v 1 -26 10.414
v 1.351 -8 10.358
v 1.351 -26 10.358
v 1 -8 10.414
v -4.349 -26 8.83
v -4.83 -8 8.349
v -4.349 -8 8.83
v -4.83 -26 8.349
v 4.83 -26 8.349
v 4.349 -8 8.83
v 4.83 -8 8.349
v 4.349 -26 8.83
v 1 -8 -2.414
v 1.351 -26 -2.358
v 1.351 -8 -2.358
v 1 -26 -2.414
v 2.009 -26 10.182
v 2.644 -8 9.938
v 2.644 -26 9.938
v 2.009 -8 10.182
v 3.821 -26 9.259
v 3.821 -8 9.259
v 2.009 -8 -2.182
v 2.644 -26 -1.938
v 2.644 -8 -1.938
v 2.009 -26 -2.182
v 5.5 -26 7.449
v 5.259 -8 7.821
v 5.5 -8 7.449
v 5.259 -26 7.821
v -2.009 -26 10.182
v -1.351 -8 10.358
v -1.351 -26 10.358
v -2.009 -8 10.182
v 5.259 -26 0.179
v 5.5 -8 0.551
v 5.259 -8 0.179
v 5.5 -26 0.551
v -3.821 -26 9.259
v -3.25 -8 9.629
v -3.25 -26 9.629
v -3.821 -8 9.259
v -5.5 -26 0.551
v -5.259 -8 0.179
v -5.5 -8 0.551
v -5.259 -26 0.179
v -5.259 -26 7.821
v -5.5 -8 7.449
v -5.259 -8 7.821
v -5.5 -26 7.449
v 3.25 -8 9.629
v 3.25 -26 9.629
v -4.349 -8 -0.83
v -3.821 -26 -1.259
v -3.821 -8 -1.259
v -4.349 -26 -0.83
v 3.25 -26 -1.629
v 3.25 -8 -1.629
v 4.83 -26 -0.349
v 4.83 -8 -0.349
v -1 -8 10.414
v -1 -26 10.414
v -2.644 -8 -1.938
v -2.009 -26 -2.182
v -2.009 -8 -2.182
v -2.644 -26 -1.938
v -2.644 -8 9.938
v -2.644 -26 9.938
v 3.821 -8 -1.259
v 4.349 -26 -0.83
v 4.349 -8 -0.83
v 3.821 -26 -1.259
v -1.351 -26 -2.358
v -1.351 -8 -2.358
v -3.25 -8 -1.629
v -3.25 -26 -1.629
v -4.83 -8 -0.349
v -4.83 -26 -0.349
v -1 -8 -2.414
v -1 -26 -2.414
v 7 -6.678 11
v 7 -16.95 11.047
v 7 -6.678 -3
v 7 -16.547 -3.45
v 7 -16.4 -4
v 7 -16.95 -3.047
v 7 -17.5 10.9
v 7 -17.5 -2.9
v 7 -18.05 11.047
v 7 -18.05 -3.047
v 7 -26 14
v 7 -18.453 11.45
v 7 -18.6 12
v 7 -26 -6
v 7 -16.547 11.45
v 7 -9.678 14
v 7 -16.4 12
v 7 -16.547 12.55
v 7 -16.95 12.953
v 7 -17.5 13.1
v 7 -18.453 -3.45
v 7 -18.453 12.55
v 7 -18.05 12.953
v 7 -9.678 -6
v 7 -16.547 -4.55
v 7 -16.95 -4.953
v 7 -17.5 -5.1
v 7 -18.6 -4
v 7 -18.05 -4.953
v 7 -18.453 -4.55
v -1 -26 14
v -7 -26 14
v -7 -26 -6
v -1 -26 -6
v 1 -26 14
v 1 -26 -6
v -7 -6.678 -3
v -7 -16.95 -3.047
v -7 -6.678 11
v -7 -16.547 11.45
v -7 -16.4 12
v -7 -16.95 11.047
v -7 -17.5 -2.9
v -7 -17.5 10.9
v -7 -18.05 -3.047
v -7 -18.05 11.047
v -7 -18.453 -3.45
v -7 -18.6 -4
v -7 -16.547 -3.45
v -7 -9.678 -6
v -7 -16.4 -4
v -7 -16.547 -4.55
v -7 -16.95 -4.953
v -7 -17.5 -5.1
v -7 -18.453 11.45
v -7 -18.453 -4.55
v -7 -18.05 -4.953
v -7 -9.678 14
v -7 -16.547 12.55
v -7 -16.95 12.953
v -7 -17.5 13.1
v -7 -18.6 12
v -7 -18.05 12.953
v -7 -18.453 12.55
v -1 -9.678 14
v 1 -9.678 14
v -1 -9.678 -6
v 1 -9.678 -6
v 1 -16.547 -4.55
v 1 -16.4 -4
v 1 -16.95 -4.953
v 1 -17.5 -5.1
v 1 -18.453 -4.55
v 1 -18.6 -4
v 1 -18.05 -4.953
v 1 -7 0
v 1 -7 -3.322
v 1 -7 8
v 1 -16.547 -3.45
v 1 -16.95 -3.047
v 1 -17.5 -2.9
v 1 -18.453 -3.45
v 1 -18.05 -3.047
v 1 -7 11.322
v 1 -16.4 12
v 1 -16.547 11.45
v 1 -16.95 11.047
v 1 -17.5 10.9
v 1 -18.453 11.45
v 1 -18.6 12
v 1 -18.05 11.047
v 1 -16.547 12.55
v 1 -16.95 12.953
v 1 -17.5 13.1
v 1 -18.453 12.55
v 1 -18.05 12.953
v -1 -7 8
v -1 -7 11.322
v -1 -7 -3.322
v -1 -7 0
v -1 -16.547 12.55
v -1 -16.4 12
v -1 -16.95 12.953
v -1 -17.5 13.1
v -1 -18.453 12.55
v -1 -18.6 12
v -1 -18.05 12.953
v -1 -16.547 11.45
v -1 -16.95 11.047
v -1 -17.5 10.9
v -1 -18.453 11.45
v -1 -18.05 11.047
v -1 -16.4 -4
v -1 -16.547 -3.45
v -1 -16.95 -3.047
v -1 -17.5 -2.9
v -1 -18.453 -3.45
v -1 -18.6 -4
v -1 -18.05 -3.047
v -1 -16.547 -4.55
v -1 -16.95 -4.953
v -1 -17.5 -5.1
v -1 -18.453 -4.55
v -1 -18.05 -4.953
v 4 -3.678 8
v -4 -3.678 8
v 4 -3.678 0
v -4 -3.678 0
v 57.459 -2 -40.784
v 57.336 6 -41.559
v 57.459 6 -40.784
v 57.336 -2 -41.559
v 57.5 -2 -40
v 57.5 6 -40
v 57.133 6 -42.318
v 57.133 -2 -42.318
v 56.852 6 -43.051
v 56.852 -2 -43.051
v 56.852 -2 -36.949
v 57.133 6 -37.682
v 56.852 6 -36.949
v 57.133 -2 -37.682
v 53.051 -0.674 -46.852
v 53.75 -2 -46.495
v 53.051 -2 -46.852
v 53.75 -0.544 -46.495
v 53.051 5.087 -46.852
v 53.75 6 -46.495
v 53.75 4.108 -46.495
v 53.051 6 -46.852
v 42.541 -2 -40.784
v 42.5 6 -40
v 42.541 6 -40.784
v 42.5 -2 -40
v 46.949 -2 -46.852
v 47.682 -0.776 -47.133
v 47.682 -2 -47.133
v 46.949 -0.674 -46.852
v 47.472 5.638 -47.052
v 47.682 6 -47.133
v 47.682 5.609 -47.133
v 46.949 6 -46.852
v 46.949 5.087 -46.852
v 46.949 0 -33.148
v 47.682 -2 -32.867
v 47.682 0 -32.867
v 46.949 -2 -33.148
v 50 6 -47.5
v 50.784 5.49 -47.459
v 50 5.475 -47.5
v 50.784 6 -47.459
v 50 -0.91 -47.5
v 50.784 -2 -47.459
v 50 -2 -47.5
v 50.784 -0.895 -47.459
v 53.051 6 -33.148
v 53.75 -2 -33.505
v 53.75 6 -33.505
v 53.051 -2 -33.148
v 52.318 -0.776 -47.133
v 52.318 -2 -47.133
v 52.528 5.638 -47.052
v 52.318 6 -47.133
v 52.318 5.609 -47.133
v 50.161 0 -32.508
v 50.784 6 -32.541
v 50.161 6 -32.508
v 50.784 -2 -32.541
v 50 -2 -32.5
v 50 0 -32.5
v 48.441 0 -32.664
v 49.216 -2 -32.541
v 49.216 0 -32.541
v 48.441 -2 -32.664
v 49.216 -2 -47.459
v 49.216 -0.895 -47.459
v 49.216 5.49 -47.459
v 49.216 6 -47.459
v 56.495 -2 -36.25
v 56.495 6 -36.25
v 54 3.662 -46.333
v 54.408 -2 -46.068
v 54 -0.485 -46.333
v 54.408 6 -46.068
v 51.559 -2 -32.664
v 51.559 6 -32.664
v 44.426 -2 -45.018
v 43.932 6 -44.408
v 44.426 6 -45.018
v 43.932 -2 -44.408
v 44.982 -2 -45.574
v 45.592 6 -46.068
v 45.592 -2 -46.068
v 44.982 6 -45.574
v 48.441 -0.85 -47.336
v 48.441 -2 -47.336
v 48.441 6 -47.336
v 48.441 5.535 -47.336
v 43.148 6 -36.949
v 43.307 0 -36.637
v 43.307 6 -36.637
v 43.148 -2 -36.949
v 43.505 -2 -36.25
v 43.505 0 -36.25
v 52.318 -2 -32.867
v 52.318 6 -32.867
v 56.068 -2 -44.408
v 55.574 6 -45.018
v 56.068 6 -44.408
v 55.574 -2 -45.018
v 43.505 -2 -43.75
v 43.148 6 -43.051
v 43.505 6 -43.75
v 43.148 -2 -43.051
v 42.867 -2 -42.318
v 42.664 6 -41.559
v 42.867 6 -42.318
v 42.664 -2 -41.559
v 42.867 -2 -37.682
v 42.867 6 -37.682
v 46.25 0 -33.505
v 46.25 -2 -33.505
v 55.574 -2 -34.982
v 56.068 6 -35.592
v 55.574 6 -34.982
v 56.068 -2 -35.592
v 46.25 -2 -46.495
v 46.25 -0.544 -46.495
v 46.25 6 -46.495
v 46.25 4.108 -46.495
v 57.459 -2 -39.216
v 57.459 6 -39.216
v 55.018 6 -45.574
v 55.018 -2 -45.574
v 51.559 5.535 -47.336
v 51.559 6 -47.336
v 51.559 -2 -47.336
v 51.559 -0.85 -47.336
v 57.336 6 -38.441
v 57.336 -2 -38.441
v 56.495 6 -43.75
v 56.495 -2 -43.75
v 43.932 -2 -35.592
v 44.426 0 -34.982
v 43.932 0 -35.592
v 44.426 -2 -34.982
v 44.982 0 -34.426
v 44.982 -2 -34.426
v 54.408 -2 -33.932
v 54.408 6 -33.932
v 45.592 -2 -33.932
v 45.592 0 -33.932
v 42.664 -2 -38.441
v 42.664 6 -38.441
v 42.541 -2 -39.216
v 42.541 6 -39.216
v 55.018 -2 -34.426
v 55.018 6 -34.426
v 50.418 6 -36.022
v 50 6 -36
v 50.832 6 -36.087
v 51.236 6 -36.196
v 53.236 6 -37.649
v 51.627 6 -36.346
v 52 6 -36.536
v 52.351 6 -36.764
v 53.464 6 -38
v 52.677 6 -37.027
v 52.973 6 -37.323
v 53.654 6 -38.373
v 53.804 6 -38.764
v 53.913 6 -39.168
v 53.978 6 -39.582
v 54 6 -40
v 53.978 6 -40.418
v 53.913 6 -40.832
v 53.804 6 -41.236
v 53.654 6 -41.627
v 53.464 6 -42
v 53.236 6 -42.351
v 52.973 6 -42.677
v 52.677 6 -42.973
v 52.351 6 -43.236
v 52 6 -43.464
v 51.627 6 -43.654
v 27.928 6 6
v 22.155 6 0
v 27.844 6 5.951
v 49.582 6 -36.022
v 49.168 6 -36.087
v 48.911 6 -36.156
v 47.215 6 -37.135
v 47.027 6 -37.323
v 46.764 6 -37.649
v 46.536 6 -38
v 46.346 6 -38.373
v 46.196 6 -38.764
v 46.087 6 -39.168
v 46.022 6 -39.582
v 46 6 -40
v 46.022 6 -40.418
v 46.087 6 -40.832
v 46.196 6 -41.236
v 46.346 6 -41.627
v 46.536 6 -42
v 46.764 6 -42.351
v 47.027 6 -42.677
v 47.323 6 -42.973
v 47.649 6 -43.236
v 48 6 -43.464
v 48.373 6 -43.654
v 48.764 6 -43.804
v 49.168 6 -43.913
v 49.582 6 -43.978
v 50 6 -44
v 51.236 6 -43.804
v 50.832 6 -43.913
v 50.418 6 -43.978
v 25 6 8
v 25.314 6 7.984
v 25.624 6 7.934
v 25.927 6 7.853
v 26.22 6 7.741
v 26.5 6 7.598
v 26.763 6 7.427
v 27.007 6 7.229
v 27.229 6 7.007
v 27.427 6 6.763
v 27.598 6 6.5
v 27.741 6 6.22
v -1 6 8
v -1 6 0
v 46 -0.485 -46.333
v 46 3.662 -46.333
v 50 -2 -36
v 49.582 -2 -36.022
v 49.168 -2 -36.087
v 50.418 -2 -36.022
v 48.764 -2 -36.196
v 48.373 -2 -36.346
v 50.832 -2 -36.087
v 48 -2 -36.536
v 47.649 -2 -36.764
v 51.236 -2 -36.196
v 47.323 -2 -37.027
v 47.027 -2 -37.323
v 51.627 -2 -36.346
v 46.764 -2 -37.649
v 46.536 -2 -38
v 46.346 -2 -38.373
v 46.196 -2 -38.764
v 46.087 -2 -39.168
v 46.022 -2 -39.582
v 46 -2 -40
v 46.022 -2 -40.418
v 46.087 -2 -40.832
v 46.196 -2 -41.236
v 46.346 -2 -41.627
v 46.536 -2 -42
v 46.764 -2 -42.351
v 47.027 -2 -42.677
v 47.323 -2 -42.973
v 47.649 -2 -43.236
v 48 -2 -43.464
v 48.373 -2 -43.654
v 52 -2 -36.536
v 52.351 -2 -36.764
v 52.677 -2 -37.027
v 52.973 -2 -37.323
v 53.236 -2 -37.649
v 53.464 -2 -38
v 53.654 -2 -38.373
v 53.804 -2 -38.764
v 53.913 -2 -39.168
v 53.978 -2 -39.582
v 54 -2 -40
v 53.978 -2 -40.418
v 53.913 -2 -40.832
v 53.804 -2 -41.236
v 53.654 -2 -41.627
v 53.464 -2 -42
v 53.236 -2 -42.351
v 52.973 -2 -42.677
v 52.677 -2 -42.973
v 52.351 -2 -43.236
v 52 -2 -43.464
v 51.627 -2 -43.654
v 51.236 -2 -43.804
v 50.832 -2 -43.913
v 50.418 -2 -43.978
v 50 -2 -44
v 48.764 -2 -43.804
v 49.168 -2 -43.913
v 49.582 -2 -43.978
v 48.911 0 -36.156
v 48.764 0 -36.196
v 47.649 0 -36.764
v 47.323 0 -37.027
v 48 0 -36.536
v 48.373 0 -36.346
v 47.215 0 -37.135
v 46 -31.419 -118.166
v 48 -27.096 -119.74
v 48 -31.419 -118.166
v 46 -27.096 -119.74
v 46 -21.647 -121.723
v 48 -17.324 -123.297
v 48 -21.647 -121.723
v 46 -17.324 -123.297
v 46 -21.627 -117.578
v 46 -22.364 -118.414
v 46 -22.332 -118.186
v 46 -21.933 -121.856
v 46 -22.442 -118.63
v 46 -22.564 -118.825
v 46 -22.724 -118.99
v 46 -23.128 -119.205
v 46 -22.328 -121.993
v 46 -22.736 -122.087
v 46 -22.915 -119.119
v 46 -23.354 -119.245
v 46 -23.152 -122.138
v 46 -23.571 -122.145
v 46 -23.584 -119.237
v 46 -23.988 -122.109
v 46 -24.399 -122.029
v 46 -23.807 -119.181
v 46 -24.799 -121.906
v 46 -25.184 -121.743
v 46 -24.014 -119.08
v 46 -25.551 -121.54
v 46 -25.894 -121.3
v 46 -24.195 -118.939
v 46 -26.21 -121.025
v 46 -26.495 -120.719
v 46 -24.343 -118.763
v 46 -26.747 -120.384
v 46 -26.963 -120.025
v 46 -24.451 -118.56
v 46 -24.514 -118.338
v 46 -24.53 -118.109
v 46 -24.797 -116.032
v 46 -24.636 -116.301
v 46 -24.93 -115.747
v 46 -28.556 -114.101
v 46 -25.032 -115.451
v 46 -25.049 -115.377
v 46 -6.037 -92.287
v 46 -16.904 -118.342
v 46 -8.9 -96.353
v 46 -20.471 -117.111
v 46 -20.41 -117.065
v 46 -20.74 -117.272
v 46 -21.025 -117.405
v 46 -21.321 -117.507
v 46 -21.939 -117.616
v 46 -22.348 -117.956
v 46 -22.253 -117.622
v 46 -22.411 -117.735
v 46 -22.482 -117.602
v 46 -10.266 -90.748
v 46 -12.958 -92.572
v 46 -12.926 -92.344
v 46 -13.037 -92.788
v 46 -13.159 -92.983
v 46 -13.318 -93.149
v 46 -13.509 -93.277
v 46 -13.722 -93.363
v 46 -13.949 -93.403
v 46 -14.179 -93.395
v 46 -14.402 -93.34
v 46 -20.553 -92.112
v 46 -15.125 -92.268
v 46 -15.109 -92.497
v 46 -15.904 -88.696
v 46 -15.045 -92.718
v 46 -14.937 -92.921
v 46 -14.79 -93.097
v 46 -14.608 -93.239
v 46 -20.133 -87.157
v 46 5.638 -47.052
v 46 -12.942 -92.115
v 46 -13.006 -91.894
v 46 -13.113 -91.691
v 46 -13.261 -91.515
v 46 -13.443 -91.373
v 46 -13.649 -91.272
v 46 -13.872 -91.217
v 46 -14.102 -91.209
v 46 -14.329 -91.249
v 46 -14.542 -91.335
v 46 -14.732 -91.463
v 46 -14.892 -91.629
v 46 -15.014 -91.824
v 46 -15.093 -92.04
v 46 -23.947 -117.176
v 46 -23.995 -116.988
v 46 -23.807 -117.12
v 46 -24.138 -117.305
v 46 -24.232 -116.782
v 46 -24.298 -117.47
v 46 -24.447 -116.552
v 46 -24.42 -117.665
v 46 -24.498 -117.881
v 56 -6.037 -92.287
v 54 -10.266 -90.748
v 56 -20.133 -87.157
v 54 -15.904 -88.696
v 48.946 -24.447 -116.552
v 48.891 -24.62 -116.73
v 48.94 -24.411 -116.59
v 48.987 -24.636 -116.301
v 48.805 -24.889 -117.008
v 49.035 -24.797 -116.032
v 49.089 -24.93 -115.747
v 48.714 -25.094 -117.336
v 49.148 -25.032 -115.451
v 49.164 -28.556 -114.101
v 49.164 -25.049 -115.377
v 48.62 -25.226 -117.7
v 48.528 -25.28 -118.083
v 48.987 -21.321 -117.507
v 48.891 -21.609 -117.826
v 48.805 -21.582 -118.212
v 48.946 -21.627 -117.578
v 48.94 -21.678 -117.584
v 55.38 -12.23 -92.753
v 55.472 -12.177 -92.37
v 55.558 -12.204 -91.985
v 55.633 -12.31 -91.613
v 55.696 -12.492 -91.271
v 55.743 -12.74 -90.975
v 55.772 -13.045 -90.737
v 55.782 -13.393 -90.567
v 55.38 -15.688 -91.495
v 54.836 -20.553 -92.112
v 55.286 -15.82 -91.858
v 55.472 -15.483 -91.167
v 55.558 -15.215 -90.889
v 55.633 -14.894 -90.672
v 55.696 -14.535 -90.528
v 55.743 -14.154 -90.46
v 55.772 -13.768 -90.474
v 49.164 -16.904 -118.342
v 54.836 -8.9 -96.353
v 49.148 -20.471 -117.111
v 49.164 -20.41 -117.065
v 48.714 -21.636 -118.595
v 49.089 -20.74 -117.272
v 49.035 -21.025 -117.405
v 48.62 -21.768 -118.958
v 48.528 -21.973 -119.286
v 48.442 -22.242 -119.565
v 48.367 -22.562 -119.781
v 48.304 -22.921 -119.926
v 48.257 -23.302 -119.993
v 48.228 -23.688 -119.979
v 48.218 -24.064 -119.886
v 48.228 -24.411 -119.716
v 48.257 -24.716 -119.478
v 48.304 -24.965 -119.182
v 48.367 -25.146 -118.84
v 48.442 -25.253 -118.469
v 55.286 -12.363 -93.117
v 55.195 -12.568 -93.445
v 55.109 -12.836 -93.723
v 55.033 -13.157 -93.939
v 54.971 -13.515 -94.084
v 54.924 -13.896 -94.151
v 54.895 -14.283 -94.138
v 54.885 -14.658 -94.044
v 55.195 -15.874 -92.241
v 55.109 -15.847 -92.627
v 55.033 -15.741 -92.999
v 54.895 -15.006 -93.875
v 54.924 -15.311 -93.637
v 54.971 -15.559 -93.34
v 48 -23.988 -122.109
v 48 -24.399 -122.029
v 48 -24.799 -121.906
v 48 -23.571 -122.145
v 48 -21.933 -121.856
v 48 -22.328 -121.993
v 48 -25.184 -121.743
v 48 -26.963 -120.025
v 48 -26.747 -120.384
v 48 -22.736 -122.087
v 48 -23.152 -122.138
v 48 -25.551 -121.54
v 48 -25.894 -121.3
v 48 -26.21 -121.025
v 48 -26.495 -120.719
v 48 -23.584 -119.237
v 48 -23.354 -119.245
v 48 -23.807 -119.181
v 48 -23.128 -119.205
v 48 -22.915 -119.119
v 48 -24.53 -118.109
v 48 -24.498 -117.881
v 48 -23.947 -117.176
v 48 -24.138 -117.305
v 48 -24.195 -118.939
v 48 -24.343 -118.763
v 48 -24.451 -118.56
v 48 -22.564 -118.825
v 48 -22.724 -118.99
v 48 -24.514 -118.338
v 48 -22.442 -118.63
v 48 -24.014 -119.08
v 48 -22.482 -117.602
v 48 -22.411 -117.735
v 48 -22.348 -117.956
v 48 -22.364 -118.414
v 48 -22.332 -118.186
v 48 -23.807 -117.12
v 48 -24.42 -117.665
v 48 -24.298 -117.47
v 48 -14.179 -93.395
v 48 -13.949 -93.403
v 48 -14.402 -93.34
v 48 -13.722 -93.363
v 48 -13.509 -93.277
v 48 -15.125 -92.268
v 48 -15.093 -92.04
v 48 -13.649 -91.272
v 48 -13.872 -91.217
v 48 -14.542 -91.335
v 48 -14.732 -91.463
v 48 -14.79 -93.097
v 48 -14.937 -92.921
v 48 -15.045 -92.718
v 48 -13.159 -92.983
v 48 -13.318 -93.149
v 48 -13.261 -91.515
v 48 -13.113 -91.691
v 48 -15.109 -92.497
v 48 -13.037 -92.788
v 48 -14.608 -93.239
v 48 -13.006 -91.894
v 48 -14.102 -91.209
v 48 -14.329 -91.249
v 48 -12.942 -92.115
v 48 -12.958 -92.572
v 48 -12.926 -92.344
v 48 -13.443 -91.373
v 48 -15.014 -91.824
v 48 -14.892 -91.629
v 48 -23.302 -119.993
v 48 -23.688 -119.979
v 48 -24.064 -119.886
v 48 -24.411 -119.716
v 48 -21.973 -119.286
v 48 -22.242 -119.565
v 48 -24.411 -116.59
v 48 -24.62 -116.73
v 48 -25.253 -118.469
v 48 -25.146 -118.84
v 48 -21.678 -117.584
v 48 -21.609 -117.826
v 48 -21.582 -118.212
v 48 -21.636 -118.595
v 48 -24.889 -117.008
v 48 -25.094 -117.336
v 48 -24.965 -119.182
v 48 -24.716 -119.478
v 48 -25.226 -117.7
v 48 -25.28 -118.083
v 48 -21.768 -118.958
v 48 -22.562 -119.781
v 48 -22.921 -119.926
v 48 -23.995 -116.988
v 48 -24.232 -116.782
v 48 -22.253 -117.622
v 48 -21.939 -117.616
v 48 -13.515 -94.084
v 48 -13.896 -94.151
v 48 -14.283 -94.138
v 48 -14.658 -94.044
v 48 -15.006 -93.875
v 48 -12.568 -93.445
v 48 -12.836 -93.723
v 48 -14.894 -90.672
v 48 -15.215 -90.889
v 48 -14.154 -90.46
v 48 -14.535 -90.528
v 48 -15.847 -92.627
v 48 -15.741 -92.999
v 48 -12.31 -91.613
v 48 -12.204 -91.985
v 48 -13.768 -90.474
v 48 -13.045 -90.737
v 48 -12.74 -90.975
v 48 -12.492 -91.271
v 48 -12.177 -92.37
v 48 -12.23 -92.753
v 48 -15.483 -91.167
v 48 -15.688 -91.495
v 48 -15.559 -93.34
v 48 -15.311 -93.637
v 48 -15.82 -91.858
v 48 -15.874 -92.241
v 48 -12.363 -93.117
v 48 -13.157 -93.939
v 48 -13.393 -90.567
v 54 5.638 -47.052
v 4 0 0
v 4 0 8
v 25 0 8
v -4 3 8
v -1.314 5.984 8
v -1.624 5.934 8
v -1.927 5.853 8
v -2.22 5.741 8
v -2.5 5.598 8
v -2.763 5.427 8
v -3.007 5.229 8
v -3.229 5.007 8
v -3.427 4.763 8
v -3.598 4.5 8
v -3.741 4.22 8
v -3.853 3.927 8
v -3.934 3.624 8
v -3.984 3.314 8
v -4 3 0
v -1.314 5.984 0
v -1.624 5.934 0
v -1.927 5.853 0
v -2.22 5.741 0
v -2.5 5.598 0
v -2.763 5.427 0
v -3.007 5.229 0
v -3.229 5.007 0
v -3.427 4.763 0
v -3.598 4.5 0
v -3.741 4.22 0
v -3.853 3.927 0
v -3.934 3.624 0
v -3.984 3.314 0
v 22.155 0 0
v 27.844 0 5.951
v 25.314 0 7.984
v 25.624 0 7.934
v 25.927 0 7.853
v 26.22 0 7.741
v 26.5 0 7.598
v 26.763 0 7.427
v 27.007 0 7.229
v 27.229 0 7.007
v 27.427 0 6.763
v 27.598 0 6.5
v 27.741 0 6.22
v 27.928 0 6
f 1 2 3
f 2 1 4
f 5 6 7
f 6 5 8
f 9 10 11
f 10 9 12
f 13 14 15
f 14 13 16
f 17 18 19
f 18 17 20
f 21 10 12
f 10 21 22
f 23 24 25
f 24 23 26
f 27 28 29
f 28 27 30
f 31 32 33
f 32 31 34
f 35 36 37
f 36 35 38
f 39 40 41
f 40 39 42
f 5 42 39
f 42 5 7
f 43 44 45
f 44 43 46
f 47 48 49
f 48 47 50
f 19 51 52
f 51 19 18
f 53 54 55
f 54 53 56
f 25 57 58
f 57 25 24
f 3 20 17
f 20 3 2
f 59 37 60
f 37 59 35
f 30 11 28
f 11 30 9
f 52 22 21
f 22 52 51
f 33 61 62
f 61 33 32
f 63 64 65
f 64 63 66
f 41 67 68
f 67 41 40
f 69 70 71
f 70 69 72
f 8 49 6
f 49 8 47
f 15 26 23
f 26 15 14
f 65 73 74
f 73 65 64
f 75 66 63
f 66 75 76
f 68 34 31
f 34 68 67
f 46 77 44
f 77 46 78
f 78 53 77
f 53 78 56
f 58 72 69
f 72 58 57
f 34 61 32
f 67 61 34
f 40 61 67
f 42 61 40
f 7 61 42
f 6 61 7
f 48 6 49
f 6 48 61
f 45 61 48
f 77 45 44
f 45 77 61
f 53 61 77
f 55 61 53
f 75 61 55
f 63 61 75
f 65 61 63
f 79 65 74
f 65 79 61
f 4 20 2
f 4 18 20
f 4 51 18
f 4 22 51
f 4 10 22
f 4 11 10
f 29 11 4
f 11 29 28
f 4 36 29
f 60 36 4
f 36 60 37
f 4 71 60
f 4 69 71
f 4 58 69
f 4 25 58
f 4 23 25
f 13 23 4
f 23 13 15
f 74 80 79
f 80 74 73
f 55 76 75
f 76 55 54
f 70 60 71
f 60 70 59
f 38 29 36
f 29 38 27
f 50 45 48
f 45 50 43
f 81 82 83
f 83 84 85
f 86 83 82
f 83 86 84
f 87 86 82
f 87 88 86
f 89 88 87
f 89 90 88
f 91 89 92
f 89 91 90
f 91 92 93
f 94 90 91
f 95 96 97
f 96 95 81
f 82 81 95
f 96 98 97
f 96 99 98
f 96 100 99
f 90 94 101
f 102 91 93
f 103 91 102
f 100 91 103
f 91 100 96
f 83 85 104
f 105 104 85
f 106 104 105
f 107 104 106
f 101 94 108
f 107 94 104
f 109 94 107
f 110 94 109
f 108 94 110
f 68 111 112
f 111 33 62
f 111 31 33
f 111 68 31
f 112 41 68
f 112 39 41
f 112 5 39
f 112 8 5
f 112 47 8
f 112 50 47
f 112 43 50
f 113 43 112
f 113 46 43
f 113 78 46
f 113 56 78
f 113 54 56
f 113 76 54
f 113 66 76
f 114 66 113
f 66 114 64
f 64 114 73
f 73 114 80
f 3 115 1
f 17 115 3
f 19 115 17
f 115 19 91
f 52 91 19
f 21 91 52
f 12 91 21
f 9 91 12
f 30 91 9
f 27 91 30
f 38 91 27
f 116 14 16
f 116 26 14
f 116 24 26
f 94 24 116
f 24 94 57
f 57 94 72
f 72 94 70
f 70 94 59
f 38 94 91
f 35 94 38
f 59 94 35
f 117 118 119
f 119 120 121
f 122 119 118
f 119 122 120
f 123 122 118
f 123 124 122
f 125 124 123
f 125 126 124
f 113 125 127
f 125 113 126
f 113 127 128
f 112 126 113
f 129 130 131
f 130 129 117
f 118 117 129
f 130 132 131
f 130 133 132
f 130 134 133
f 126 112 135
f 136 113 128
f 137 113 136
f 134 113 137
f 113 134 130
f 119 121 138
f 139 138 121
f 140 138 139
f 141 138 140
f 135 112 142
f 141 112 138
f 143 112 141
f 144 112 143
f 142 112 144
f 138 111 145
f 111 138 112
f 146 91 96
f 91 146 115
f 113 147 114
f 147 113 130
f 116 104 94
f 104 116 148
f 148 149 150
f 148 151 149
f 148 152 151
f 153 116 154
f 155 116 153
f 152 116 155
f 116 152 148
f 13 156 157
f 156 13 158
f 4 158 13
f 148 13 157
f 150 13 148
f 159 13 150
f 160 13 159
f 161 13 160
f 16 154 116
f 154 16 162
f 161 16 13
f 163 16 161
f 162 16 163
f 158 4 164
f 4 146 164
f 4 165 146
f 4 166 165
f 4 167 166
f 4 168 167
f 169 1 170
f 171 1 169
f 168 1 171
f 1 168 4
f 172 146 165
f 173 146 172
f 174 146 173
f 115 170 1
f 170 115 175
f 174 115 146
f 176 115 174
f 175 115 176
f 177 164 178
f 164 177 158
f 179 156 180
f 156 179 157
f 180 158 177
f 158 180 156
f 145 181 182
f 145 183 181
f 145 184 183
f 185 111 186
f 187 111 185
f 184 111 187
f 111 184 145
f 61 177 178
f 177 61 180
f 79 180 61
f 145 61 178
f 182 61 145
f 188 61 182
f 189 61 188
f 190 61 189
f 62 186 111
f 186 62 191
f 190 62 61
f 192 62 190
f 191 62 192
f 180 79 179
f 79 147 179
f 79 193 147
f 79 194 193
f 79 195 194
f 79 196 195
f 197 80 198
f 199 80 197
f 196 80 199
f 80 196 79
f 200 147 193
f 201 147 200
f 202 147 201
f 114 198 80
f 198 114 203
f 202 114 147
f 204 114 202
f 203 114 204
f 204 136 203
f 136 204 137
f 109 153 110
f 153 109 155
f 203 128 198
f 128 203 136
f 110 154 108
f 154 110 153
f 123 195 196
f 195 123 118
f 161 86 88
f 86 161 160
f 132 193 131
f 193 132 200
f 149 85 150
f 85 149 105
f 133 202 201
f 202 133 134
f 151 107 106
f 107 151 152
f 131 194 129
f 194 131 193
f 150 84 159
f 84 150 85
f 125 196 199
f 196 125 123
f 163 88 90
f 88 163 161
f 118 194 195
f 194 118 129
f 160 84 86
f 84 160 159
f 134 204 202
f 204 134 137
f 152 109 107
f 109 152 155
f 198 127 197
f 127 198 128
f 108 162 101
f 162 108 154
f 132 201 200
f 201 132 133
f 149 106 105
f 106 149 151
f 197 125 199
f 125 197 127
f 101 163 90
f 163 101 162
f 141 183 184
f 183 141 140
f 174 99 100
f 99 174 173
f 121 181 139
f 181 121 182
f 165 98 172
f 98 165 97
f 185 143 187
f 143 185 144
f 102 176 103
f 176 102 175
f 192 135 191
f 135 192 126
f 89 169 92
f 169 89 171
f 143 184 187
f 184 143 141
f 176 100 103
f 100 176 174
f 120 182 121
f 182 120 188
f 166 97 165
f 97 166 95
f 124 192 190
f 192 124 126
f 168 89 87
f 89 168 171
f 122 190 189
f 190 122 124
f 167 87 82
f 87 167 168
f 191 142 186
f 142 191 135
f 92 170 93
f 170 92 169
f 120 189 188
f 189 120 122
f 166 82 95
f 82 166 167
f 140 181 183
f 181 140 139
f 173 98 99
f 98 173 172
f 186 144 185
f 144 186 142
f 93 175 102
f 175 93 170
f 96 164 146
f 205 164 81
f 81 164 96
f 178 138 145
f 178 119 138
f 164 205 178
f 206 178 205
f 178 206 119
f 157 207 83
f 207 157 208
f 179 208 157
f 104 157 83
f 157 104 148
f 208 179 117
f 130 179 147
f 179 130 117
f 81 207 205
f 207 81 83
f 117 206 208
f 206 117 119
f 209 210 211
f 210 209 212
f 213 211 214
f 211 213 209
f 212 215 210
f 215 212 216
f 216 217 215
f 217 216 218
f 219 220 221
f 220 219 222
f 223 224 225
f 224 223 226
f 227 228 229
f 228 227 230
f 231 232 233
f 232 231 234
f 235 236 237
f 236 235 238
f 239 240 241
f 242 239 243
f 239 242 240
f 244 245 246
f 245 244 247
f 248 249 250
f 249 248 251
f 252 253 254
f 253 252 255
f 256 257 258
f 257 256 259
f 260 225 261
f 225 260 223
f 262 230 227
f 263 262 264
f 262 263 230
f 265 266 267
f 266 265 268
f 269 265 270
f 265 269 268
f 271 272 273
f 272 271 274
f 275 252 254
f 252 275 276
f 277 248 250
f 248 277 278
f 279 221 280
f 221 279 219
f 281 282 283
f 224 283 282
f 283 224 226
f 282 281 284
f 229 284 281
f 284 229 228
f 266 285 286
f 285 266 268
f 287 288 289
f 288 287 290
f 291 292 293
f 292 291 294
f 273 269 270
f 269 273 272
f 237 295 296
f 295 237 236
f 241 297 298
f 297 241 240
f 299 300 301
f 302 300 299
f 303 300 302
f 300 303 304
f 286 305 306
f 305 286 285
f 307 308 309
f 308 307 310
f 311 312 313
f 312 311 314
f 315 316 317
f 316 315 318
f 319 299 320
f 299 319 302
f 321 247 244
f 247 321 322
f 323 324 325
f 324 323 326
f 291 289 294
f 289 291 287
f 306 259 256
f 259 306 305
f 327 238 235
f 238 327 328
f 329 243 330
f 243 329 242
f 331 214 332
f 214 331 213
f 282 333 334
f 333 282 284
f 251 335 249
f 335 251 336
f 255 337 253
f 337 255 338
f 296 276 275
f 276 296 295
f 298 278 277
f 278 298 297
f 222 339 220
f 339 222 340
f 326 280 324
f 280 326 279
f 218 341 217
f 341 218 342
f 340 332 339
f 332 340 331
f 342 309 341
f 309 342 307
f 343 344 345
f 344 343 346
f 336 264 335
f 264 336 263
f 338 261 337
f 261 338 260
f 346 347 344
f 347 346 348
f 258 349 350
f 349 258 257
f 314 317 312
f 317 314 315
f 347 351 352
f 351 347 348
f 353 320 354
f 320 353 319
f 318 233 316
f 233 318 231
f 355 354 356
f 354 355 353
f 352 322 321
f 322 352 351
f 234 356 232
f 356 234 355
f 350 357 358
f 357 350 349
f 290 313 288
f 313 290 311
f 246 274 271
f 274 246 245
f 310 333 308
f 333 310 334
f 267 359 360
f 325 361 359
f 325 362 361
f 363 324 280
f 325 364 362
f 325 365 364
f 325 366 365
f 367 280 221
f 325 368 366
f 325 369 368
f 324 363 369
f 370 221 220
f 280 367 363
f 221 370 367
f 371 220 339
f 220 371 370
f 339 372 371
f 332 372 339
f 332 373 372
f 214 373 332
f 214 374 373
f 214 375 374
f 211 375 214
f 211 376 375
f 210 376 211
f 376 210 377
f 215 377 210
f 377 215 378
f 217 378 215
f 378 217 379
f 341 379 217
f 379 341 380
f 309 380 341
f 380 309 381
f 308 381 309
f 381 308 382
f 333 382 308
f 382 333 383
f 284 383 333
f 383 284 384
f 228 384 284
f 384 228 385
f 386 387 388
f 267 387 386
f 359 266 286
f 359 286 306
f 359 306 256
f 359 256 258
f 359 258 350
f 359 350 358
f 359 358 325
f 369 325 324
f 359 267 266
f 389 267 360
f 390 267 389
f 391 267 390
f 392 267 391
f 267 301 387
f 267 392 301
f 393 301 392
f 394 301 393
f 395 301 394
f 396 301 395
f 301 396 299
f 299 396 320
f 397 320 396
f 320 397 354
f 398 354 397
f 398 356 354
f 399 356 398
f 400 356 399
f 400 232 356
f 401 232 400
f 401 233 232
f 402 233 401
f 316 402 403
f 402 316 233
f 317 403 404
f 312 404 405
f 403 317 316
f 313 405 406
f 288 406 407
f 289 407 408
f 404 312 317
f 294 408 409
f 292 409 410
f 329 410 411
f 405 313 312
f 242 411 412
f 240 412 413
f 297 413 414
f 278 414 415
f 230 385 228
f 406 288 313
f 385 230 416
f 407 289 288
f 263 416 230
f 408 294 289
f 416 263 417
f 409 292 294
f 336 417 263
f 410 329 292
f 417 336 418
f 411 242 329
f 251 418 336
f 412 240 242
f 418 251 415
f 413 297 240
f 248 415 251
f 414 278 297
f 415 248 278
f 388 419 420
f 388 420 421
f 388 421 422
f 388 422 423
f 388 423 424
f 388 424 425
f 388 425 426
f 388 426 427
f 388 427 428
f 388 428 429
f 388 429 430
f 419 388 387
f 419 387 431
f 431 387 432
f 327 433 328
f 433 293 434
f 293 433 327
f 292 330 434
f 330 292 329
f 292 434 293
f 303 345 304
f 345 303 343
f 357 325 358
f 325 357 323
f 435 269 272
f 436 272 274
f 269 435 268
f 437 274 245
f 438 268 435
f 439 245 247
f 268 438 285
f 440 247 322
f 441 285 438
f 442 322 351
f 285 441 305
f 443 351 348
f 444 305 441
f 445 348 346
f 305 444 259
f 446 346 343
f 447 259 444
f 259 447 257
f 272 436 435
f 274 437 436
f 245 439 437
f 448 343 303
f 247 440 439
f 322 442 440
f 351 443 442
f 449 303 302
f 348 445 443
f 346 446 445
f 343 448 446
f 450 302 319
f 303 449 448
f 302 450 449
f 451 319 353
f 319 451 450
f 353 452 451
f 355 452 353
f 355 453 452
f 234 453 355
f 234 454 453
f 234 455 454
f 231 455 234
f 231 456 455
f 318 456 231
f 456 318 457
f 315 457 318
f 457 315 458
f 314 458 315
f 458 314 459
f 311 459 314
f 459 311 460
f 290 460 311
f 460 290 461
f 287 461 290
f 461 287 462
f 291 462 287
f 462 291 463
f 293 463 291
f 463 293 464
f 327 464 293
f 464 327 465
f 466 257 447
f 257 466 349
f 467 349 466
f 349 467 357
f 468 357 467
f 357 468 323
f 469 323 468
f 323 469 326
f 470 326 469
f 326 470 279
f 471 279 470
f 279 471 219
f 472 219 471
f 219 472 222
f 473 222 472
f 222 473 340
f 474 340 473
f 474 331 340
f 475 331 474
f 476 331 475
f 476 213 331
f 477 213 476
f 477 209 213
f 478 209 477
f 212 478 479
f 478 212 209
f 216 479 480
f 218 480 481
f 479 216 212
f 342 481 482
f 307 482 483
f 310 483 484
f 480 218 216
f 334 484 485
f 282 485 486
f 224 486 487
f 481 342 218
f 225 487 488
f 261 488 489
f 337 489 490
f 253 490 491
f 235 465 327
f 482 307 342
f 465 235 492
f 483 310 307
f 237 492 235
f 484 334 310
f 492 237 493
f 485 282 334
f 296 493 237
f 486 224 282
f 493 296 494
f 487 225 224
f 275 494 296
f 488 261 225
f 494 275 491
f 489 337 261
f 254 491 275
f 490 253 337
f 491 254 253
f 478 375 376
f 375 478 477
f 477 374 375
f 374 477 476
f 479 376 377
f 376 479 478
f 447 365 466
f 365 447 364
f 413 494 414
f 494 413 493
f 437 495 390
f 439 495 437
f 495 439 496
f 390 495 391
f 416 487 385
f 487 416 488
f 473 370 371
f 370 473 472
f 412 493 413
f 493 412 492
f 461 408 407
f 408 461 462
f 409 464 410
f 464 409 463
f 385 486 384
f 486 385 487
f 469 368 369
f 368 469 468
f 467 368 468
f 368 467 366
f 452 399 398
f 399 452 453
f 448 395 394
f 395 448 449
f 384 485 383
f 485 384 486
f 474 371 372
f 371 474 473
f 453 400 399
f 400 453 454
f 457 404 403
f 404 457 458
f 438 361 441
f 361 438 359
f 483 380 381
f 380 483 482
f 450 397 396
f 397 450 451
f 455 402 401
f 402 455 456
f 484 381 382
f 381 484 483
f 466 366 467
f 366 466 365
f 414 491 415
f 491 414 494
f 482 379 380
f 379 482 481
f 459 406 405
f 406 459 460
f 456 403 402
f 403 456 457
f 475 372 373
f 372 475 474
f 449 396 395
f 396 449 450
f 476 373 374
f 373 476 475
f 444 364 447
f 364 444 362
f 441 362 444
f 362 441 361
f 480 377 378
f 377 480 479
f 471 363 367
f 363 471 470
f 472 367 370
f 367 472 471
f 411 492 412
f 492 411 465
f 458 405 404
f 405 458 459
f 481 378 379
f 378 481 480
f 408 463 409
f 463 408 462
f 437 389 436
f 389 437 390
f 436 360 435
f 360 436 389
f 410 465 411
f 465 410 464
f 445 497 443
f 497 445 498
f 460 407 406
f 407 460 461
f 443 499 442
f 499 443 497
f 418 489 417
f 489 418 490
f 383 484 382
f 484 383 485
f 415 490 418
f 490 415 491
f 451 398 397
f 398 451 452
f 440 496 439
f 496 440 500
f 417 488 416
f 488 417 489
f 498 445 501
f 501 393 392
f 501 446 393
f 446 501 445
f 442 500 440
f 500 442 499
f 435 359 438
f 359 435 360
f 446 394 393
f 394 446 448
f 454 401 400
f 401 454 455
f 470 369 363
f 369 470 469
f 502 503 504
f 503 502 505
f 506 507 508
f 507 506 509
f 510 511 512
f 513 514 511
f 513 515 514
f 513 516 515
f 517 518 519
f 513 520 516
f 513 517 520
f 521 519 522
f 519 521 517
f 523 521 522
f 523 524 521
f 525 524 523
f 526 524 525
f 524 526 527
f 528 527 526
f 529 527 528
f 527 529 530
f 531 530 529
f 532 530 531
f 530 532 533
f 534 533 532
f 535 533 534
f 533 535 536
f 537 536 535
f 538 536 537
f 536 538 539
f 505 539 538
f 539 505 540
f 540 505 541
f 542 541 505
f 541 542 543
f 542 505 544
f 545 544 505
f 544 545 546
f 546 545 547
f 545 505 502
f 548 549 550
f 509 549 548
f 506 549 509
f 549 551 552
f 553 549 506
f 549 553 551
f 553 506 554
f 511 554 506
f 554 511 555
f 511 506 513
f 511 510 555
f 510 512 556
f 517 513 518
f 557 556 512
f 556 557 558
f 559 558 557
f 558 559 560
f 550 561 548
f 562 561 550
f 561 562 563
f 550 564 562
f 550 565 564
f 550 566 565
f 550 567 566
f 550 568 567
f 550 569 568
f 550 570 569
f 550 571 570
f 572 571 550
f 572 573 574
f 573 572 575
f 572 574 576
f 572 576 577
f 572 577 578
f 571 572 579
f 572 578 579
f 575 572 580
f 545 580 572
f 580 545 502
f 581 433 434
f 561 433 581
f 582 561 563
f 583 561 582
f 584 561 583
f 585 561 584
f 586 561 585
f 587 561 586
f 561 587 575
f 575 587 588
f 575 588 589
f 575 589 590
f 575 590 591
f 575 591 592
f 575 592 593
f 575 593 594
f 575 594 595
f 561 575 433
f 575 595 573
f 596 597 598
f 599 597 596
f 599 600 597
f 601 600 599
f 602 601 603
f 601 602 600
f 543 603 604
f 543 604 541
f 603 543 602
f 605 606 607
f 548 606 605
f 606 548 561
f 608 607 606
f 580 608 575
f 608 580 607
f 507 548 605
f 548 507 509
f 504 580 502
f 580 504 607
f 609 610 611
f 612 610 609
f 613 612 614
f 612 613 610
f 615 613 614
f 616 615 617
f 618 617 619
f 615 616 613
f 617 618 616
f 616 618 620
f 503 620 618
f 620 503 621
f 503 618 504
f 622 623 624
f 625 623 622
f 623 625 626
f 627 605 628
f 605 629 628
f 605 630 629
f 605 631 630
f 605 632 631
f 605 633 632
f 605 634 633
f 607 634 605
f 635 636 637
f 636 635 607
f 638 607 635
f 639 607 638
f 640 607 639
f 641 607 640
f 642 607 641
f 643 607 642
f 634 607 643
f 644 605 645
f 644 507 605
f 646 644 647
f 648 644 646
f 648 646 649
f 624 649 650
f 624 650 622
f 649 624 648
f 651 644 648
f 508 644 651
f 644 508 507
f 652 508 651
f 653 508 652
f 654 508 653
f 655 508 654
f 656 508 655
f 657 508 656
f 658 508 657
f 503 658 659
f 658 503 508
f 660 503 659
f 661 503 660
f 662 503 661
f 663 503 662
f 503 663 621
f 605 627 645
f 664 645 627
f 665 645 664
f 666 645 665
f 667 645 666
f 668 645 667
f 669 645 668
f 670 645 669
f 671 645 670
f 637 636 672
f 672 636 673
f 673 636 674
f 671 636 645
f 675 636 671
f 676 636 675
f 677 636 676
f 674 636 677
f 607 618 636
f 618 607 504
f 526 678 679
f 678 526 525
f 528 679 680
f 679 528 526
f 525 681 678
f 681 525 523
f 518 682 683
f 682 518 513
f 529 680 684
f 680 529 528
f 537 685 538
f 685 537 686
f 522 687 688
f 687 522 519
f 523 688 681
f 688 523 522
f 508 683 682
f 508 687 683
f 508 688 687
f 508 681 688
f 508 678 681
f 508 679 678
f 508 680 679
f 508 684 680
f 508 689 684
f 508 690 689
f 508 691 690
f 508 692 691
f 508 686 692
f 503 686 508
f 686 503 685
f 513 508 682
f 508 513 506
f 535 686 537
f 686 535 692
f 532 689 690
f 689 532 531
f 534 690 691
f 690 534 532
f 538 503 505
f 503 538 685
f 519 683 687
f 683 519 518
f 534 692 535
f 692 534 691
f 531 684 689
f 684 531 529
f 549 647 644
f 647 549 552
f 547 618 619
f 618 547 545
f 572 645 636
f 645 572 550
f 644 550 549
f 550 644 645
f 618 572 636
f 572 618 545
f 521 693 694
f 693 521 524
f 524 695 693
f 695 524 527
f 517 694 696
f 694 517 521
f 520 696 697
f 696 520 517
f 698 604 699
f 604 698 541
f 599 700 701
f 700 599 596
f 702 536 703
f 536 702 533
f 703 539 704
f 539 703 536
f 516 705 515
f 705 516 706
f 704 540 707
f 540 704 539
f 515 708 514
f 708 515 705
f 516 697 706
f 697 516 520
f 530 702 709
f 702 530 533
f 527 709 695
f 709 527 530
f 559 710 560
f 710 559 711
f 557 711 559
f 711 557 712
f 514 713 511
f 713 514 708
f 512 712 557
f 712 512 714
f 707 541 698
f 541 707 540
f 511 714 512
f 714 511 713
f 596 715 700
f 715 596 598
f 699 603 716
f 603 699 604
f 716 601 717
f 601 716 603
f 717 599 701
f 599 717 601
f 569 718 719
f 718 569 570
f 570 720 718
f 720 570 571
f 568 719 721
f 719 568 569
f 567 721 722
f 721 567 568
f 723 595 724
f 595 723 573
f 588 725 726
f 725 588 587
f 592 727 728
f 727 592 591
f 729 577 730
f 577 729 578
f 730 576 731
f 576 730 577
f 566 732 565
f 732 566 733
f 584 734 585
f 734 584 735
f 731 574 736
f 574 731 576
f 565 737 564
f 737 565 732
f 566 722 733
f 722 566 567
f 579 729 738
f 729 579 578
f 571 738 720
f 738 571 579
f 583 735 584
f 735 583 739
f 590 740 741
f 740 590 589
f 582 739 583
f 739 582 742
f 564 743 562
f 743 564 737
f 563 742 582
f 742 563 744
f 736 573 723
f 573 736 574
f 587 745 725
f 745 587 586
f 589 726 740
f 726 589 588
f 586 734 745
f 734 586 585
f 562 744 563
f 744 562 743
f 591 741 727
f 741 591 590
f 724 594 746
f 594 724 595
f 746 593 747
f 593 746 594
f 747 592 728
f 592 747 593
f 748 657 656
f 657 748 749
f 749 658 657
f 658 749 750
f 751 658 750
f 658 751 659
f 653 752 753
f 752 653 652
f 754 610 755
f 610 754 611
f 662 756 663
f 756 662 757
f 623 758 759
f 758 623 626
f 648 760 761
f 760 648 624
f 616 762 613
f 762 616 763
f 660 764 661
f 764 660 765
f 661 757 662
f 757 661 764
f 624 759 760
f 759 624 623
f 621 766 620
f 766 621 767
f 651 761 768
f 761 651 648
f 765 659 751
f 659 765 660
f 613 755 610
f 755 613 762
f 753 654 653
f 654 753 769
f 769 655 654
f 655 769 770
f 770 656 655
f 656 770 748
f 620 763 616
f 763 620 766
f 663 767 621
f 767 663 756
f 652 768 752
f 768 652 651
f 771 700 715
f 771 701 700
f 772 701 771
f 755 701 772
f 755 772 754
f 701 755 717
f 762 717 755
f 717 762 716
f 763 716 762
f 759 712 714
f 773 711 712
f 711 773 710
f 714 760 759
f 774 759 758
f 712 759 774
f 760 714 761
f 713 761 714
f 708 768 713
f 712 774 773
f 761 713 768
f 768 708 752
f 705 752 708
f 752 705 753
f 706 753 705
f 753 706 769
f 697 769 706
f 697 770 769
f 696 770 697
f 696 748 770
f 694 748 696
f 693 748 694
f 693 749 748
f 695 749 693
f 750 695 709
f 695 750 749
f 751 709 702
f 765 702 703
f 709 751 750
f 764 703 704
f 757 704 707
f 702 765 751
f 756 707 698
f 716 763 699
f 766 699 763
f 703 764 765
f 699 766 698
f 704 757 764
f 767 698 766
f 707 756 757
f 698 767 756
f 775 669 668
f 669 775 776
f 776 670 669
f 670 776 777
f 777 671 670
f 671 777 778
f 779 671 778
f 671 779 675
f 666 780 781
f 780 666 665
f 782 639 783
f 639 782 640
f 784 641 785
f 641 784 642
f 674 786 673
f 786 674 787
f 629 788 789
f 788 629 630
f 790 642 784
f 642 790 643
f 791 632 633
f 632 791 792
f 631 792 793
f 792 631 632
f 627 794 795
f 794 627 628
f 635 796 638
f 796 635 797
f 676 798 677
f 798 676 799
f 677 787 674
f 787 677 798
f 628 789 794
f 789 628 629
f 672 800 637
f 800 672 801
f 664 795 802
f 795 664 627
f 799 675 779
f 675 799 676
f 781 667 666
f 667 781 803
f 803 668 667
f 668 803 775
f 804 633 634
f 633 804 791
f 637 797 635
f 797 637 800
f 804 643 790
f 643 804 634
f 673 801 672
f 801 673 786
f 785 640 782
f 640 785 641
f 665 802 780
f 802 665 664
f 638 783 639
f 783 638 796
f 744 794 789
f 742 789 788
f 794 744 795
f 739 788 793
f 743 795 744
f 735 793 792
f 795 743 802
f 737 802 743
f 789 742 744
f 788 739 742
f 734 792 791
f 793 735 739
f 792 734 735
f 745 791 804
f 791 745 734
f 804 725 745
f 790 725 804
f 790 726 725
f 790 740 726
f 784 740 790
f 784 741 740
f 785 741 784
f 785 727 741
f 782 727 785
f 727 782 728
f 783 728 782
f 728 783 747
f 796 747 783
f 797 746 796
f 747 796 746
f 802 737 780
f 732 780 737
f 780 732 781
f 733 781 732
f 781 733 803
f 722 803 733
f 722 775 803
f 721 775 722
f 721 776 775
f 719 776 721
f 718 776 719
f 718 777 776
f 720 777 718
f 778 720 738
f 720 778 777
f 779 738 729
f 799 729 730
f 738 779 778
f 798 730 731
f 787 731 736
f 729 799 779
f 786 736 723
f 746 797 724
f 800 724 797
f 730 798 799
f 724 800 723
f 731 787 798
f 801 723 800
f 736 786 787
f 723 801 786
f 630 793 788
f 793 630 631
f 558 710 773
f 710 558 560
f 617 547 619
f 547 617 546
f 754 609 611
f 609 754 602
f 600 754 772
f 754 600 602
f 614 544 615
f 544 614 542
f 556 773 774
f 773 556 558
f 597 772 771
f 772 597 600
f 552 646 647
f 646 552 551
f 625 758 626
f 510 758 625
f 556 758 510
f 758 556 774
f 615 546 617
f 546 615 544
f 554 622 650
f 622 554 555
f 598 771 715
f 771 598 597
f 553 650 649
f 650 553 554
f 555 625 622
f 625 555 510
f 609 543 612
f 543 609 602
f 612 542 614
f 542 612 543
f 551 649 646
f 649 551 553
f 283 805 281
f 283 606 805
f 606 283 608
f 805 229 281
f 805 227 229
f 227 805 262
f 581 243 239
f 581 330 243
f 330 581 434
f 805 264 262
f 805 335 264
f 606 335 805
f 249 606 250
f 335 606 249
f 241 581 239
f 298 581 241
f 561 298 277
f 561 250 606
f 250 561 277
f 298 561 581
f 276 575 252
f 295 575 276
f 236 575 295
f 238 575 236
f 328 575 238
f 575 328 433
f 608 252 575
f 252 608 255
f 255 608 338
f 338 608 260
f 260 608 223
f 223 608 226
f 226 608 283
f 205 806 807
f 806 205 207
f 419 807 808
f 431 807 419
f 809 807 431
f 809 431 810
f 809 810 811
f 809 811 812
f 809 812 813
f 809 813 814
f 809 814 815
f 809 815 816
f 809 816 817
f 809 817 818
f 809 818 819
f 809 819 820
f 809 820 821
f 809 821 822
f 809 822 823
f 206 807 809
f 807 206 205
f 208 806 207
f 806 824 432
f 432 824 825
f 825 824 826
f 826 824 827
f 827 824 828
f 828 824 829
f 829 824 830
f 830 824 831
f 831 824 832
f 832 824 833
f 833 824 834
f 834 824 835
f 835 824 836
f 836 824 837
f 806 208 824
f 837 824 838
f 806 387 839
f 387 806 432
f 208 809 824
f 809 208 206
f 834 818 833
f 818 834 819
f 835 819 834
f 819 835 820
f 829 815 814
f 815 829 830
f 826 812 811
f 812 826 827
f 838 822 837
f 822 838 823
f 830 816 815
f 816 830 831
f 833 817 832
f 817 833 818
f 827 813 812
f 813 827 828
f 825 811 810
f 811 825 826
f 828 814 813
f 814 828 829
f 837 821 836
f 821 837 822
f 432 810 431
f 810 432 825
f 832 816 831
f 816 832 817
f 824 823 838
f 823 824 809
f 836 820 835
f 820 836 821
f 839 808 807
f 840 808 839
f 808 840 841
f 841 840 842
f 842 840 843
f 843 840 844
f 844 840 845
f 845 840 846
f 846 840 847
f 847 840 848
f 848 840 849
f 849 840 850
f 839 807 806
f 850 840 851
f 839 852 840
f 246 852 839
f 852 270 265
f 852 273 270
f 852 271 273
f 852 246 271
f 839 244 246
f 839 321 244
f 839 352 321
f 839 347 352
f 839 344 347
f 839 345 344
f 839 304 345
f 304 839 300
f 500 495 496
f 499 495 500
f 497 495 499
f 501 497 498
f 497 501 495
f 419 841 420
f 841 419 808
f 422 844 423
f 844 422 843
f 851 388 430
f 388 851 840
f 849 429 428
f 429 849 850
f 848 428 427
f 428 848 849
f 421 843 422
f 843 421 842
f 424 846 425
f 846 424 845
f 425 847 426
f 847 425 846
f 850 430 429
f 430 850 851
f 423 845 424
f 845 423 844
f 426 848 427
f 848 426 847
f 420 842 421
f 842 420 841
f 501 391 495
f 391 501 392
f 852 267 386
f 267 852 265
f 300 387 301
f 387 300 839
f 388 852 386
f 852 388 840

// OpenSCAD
rotate([90,0,0])translate([0,4,3])clamp();

// apoyos para imprimir sin despegarse
//translate([10,-10,-6])cylinder(d=18,h=0.5);
//translate([-10,-10,-6])cylinder(d=18,h=0.5);


$fn=60;

translate([-4,-7,0])cube([8,10,8]);
translate([-1,3,0])rotate([0,0,-90])
cylinder(d=6,h=8);
translate([-1,0,0])cube([26,6,8]);
translate([25,6,5])rotate([90,0,0])
cylinder(d=6,h=6);
translate([21,0,2])rotate([0,60,0])
cube([47,6,8]);
difference(){
translate([50,-2,-40])rotate([-90,0,0])
cylinder(d=15,h=8);
translate([50,-3,-40])rotate([-90,0,0])
cylinder(d=8,h=10);
}
translate([46,0,-45])
rotate([-20,0,0])
rotate([0,90,0])
{
    cube([47,6,8]);
    translate([63,3,0])rotate([0,0,0])
    servo_bracket();
}

module clamp(){
difference(){
translate([-7,-10,0])
cube([14,20,23]);
difference(){
    translate([0,0,5])cylinder(d=13,h=25,$fn=60);
    translate([6.5,0,12])cube([2,12,25],center=true);
    translate([-6.5,0,12])cube([2,12,25],center=true);
}
translate([-1,-11,4])cube([2,22,25]);
translate([-9,-8,14.5])rotate([0,90,0])
cylinder(d=2.2,h=21,$fn=12);
translate([-9,8,14.5])rotate([0,90,0])
cylinder(d=2.2,h=21,$fn=12);
translate([0,21,0])rotate([45,0,0])cube(size=[25,25,25],center=true);
translate([0,-21,0])rotate([45,0,0])cube(size=[25,25,25],center=true);
translate([21,0,0])rotate([0,0,90])rotate([45,0,0])
cube(size=[25,25,25],center=true);
translate([-21,0,0])rotate([0,0,90])rotate([45,0,0])
cube(size=[25,25,25],center=true);
}
}

module servo_bracket(){
difference(){
union(){
translate([0,0,1])cube([33,15,2],center=true);
translate([0,7.5,2])
rotate([90,0,0])linear_extrude(height=15)
polygon([[-16.5,0],[16.5,0],[-16.5,8]]);
translate([13.75,0,0])cylinder(d=8,h=2,$fn=60);
}
cube([23.4,12.4,50],center=true);
translate([13.75,0,-1])cylinder(d=2.2,h=5,$fn=30);
translate([-13.75,0,-1])cylinder(d=2.2,h=50,$fn=30);
translate([13.75,0,2])cylinder(d=3.7,h=5,$fn=30);
translate([-13.75,0,2])cylinder(d=3.7,h=50,$fn=30);
translate([10,0,0])cylinder(d=6,h=12,$fn=60);
}
}
